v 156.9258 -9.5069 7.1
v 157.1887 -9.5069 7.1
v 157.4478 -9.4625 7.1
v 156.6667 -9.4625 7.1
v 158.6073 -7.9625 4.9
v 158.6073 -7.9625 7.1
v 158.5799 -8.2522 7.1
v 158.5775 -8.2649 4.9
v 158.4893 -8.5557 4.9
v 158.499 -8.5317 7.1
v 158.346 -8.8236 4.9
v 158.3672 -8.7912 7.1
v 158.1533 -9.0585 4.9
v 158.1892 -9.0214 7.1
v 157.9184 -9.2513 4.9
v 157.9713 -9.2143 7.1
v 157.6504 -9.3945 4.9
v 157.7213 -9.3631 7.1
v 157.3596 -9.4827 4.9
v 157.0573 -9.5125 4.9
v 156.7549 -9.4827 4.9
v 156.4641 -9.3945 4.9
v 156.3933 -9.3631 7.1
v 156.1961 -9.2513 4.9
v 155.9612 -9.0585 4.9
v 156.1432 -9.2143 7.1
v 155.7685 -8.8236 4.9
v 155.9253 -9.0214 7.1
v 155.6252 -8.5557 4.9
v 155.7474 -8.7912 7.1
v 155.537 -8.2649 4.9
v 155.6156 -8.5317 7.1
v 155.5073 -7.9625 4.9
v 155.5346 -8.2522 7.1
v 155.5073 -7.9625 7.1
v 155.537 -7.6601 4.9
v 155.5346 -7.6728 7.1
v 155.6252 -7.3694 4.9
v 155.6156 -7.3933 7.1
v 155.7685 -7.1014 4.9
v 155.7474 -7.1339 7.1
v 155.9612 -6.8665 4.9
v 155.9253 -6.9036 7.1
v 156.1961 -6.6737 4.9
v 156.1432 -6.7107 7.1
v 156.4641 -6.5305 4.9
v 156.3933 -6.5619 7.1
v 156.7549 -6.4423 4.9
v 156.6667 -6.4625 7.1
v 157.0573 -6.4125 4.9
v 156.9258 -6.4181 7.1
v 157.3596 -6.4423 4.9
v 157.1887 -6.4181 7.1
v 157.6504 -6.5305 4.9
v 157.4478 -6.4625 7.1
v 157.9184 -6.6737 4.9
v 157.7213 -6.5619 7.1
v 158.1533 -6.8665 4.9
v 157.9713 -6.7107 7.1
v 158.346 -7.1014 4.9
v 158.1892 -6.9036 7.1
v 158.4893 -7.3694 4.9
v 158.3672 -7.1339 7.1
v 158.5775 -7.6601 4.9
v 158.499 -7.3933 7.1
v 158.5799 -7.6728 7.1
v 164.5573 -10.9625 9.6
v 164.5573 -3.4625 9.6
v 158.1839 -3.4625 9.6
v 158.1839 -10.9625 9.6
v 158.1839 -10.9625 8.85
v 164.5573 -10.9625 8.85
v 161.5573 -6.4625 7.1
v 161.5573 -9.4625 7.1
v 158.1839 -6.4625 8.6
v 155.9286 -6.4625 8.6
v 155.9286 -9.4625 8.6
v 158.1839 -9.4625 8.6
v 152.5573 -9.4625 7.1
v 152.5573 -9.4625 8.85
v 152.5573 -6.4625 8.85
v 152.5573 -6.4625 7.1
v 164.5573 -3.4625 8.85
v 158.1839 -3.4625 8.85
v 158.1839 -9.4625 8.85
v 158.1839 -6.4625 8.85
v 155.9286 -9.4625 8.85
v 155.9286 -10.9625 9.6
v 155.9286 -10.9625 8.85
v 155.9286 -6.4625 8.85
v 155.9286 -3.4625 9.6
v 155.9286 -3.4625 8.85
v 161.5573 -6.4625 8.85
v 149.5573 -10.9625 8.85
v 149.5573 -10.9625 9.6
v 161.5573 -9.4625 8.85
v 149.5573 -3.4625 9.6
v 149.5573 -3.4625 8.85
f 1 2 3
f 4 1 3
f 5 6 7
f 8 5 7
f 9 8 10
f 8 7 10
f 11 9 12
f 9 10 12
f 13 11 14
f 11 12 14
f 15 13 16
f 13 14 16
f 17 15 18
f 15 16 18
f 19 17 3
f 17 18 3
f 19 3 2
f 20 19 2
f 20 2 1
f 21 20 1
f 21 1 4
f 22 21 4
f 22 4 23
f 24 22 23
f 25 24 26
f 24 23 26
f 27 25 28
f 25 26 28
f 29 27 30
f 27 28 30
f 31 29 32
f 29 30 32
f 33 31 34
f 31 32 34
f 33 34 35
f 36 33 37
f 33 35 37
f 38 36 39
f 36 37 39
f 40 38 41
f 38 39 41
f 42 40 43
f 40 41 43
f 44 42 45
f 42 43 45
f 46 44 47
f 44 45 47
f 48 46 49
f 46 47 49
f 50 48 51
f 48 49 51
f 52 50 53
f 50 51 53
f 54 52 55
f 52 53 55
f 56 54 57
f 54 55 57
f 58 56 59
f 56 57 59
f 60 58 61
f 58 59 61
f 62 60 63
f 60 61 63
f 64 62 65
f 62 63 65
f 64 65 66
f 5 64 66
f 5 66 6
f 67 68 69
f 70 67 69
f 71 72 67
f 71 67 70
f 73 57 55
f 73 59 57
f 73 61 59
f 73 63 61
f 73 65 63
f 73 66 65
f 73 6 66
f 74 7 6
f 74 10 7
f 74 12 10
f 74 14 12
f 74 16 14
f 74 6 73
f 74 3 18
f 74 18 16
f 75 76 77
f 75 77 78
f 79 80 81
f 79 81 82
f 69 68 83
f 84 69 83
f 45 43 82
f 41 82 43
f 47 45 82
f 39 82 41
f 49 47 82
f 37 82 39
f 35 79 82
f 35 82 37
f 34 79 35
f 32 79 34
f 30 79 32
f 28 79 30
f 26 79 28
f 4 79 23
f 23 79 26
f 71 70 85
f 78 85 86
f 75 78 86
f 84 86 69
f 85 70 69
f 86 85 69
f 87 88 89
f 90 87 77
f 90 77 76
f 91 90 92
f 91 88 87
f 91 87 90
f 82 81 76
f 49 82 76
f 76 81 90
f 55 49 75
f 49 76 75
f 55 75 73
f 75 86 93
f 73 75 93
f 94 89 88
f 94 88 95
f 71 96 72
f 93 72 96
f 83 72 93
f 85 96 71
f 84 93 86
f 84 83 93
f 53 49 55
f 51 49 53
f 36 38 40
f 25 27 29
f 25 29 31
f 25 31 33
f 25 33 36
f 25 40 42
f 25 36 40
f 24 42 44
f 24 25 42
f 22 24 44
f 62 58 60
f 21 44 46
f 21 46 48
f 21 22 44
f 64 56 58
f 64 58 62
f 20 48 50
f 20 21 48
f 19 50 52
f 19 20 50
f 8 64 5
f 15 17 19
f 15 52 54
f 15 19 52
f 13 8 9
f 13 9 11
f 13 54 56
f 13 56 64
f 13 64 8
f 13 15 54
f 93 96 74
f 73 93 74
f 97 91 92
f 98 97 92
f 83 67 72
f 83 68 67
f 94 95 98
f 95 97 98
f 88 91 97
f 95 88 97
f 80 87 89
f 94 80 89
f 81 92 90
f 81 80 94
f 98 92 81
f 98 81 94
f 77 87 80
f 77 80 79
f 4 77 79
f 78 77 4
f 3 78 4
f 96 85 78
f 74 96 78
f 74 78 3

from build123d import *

# Parameters (mm, degrees)
SKETCH029_W             = 9
SKETCH029_H             = 3
PAD012_DEPTH            = 2.5
SKETCH030_R             = 1.55
PAD013_DEPTH            = 2.2
SKETCH035_W             = 9
SKETCH035_H             = 0.75
PAD014_DEPTH            = 3
SKETCH036_W             = 6
SKETCH036_H             = 0.75
PAD015_DEPTH            = 3
SKETCH037_W             = 6
SKETCH037_H             = 0.75
PAD016_DEPTH            = 3
SKETCH048_W             = 15
SKETCH048_H             = 0.75
PAD022_DEPTH            = 1.5
SKETCH049_W             = 2.255218
SKETCH049_H             = 8.498976
POCKET022_DEPTH         = 1
BODY003_PLACEMENT_ANGLE = 90


with BuildPart() as part:
    # Sketch029 → Pad012 (new body)
    with BuildSketch(Plane.XZ):
        with Locations((10.557257, 18.562511)):
            Rectangle(SKETCH029_W, SKETCH029_H)
    extrude(amount=PAD012_DEPTH)

    # Sketch030 (on Face6 of Pad012) → Pad013 (join)
    with BuildSketch(Plane.XZ.offset(2.5)):
        with Locations((10.557257, 18.562511)):
            Circle(SKETCH030_R)
    extrude(amount=PAD013_DEPTH)

    # Sketch035 → Pad014 (join)
    with BuildSketch(Plane(origin=(0, 0, 17.062511), x_dir=(1, 0, 0), z_dir=(0, 0, -1))):
        with Locations((10.557257, 0.375)):
            Rectangle(SKETCH035_W, SKETCH035_H)
    extrude(amount=PAD014_DEPTH)

    # Sketch036 (on Face15 of Pad014) → Pad015 (join)
    with BuildSketch(Plane(origin=(15.057257, 0, 0), x_dir=(0, 0, 1), z_dir=(1, 0, 0))):
        with Locations((17.062511, 0.375)):
            Rectangle(SKETCH036_W, SKETCH036_H)
    extrude(amount=PAD015_DEPTH)

    # Sketch037 (on Face3 of Pad015) → Pad016 (join)
    with BuildSketch(Plane(origin=(6.057257, 0, 0), x_dir=(0, 0, -1), z_dir=(-1, 0, 0))):
        with Locations((-17.062511, 0.375)):
            Rectangle(SKETCH037_W, SKETCH037_H)
    extrude(amount=PAD016_DEPTH)

    # Sketch048 (on Face5 of Pad016) → Pad022 (join)
    with BuildSketch(Plane(origin=(0, 0, 20.062511), x_dir=(-1, 0, 0), z_dir=(0, 0, 1))):
        with Locations((-10.557257, 0.375)):
            Rectangle(SKETCH048_W, SKETCH048_H)
    extrude(amount=PAD022_DEPTH)

    # Sketch049 (on Face23 of Pad022) → Pocket022 (cut)
    with BuildSketch(Plane(origin=(0, 0, 0), x_dir=(1, 0, 0), z_dir=(0, 1, 0))):
        with Locations((10.556244, -17.71185)):
            Rectangle(SKETCH049_W, SKETCH049_H)
    extrude(amount=-POCKET022_DEPTH, mode=Mode.SUBTRACT)


with BuildPart() as part_1:
    # Body003 placement: moved
    add(part.part.moved(Location((146.5, 10.6, 9.6))).rotate(Axis((146.5, 10.6, 9.6), (1, 0, 0)), BODY003_PLACEMENT_ANGLE))


solid = part_1.part
